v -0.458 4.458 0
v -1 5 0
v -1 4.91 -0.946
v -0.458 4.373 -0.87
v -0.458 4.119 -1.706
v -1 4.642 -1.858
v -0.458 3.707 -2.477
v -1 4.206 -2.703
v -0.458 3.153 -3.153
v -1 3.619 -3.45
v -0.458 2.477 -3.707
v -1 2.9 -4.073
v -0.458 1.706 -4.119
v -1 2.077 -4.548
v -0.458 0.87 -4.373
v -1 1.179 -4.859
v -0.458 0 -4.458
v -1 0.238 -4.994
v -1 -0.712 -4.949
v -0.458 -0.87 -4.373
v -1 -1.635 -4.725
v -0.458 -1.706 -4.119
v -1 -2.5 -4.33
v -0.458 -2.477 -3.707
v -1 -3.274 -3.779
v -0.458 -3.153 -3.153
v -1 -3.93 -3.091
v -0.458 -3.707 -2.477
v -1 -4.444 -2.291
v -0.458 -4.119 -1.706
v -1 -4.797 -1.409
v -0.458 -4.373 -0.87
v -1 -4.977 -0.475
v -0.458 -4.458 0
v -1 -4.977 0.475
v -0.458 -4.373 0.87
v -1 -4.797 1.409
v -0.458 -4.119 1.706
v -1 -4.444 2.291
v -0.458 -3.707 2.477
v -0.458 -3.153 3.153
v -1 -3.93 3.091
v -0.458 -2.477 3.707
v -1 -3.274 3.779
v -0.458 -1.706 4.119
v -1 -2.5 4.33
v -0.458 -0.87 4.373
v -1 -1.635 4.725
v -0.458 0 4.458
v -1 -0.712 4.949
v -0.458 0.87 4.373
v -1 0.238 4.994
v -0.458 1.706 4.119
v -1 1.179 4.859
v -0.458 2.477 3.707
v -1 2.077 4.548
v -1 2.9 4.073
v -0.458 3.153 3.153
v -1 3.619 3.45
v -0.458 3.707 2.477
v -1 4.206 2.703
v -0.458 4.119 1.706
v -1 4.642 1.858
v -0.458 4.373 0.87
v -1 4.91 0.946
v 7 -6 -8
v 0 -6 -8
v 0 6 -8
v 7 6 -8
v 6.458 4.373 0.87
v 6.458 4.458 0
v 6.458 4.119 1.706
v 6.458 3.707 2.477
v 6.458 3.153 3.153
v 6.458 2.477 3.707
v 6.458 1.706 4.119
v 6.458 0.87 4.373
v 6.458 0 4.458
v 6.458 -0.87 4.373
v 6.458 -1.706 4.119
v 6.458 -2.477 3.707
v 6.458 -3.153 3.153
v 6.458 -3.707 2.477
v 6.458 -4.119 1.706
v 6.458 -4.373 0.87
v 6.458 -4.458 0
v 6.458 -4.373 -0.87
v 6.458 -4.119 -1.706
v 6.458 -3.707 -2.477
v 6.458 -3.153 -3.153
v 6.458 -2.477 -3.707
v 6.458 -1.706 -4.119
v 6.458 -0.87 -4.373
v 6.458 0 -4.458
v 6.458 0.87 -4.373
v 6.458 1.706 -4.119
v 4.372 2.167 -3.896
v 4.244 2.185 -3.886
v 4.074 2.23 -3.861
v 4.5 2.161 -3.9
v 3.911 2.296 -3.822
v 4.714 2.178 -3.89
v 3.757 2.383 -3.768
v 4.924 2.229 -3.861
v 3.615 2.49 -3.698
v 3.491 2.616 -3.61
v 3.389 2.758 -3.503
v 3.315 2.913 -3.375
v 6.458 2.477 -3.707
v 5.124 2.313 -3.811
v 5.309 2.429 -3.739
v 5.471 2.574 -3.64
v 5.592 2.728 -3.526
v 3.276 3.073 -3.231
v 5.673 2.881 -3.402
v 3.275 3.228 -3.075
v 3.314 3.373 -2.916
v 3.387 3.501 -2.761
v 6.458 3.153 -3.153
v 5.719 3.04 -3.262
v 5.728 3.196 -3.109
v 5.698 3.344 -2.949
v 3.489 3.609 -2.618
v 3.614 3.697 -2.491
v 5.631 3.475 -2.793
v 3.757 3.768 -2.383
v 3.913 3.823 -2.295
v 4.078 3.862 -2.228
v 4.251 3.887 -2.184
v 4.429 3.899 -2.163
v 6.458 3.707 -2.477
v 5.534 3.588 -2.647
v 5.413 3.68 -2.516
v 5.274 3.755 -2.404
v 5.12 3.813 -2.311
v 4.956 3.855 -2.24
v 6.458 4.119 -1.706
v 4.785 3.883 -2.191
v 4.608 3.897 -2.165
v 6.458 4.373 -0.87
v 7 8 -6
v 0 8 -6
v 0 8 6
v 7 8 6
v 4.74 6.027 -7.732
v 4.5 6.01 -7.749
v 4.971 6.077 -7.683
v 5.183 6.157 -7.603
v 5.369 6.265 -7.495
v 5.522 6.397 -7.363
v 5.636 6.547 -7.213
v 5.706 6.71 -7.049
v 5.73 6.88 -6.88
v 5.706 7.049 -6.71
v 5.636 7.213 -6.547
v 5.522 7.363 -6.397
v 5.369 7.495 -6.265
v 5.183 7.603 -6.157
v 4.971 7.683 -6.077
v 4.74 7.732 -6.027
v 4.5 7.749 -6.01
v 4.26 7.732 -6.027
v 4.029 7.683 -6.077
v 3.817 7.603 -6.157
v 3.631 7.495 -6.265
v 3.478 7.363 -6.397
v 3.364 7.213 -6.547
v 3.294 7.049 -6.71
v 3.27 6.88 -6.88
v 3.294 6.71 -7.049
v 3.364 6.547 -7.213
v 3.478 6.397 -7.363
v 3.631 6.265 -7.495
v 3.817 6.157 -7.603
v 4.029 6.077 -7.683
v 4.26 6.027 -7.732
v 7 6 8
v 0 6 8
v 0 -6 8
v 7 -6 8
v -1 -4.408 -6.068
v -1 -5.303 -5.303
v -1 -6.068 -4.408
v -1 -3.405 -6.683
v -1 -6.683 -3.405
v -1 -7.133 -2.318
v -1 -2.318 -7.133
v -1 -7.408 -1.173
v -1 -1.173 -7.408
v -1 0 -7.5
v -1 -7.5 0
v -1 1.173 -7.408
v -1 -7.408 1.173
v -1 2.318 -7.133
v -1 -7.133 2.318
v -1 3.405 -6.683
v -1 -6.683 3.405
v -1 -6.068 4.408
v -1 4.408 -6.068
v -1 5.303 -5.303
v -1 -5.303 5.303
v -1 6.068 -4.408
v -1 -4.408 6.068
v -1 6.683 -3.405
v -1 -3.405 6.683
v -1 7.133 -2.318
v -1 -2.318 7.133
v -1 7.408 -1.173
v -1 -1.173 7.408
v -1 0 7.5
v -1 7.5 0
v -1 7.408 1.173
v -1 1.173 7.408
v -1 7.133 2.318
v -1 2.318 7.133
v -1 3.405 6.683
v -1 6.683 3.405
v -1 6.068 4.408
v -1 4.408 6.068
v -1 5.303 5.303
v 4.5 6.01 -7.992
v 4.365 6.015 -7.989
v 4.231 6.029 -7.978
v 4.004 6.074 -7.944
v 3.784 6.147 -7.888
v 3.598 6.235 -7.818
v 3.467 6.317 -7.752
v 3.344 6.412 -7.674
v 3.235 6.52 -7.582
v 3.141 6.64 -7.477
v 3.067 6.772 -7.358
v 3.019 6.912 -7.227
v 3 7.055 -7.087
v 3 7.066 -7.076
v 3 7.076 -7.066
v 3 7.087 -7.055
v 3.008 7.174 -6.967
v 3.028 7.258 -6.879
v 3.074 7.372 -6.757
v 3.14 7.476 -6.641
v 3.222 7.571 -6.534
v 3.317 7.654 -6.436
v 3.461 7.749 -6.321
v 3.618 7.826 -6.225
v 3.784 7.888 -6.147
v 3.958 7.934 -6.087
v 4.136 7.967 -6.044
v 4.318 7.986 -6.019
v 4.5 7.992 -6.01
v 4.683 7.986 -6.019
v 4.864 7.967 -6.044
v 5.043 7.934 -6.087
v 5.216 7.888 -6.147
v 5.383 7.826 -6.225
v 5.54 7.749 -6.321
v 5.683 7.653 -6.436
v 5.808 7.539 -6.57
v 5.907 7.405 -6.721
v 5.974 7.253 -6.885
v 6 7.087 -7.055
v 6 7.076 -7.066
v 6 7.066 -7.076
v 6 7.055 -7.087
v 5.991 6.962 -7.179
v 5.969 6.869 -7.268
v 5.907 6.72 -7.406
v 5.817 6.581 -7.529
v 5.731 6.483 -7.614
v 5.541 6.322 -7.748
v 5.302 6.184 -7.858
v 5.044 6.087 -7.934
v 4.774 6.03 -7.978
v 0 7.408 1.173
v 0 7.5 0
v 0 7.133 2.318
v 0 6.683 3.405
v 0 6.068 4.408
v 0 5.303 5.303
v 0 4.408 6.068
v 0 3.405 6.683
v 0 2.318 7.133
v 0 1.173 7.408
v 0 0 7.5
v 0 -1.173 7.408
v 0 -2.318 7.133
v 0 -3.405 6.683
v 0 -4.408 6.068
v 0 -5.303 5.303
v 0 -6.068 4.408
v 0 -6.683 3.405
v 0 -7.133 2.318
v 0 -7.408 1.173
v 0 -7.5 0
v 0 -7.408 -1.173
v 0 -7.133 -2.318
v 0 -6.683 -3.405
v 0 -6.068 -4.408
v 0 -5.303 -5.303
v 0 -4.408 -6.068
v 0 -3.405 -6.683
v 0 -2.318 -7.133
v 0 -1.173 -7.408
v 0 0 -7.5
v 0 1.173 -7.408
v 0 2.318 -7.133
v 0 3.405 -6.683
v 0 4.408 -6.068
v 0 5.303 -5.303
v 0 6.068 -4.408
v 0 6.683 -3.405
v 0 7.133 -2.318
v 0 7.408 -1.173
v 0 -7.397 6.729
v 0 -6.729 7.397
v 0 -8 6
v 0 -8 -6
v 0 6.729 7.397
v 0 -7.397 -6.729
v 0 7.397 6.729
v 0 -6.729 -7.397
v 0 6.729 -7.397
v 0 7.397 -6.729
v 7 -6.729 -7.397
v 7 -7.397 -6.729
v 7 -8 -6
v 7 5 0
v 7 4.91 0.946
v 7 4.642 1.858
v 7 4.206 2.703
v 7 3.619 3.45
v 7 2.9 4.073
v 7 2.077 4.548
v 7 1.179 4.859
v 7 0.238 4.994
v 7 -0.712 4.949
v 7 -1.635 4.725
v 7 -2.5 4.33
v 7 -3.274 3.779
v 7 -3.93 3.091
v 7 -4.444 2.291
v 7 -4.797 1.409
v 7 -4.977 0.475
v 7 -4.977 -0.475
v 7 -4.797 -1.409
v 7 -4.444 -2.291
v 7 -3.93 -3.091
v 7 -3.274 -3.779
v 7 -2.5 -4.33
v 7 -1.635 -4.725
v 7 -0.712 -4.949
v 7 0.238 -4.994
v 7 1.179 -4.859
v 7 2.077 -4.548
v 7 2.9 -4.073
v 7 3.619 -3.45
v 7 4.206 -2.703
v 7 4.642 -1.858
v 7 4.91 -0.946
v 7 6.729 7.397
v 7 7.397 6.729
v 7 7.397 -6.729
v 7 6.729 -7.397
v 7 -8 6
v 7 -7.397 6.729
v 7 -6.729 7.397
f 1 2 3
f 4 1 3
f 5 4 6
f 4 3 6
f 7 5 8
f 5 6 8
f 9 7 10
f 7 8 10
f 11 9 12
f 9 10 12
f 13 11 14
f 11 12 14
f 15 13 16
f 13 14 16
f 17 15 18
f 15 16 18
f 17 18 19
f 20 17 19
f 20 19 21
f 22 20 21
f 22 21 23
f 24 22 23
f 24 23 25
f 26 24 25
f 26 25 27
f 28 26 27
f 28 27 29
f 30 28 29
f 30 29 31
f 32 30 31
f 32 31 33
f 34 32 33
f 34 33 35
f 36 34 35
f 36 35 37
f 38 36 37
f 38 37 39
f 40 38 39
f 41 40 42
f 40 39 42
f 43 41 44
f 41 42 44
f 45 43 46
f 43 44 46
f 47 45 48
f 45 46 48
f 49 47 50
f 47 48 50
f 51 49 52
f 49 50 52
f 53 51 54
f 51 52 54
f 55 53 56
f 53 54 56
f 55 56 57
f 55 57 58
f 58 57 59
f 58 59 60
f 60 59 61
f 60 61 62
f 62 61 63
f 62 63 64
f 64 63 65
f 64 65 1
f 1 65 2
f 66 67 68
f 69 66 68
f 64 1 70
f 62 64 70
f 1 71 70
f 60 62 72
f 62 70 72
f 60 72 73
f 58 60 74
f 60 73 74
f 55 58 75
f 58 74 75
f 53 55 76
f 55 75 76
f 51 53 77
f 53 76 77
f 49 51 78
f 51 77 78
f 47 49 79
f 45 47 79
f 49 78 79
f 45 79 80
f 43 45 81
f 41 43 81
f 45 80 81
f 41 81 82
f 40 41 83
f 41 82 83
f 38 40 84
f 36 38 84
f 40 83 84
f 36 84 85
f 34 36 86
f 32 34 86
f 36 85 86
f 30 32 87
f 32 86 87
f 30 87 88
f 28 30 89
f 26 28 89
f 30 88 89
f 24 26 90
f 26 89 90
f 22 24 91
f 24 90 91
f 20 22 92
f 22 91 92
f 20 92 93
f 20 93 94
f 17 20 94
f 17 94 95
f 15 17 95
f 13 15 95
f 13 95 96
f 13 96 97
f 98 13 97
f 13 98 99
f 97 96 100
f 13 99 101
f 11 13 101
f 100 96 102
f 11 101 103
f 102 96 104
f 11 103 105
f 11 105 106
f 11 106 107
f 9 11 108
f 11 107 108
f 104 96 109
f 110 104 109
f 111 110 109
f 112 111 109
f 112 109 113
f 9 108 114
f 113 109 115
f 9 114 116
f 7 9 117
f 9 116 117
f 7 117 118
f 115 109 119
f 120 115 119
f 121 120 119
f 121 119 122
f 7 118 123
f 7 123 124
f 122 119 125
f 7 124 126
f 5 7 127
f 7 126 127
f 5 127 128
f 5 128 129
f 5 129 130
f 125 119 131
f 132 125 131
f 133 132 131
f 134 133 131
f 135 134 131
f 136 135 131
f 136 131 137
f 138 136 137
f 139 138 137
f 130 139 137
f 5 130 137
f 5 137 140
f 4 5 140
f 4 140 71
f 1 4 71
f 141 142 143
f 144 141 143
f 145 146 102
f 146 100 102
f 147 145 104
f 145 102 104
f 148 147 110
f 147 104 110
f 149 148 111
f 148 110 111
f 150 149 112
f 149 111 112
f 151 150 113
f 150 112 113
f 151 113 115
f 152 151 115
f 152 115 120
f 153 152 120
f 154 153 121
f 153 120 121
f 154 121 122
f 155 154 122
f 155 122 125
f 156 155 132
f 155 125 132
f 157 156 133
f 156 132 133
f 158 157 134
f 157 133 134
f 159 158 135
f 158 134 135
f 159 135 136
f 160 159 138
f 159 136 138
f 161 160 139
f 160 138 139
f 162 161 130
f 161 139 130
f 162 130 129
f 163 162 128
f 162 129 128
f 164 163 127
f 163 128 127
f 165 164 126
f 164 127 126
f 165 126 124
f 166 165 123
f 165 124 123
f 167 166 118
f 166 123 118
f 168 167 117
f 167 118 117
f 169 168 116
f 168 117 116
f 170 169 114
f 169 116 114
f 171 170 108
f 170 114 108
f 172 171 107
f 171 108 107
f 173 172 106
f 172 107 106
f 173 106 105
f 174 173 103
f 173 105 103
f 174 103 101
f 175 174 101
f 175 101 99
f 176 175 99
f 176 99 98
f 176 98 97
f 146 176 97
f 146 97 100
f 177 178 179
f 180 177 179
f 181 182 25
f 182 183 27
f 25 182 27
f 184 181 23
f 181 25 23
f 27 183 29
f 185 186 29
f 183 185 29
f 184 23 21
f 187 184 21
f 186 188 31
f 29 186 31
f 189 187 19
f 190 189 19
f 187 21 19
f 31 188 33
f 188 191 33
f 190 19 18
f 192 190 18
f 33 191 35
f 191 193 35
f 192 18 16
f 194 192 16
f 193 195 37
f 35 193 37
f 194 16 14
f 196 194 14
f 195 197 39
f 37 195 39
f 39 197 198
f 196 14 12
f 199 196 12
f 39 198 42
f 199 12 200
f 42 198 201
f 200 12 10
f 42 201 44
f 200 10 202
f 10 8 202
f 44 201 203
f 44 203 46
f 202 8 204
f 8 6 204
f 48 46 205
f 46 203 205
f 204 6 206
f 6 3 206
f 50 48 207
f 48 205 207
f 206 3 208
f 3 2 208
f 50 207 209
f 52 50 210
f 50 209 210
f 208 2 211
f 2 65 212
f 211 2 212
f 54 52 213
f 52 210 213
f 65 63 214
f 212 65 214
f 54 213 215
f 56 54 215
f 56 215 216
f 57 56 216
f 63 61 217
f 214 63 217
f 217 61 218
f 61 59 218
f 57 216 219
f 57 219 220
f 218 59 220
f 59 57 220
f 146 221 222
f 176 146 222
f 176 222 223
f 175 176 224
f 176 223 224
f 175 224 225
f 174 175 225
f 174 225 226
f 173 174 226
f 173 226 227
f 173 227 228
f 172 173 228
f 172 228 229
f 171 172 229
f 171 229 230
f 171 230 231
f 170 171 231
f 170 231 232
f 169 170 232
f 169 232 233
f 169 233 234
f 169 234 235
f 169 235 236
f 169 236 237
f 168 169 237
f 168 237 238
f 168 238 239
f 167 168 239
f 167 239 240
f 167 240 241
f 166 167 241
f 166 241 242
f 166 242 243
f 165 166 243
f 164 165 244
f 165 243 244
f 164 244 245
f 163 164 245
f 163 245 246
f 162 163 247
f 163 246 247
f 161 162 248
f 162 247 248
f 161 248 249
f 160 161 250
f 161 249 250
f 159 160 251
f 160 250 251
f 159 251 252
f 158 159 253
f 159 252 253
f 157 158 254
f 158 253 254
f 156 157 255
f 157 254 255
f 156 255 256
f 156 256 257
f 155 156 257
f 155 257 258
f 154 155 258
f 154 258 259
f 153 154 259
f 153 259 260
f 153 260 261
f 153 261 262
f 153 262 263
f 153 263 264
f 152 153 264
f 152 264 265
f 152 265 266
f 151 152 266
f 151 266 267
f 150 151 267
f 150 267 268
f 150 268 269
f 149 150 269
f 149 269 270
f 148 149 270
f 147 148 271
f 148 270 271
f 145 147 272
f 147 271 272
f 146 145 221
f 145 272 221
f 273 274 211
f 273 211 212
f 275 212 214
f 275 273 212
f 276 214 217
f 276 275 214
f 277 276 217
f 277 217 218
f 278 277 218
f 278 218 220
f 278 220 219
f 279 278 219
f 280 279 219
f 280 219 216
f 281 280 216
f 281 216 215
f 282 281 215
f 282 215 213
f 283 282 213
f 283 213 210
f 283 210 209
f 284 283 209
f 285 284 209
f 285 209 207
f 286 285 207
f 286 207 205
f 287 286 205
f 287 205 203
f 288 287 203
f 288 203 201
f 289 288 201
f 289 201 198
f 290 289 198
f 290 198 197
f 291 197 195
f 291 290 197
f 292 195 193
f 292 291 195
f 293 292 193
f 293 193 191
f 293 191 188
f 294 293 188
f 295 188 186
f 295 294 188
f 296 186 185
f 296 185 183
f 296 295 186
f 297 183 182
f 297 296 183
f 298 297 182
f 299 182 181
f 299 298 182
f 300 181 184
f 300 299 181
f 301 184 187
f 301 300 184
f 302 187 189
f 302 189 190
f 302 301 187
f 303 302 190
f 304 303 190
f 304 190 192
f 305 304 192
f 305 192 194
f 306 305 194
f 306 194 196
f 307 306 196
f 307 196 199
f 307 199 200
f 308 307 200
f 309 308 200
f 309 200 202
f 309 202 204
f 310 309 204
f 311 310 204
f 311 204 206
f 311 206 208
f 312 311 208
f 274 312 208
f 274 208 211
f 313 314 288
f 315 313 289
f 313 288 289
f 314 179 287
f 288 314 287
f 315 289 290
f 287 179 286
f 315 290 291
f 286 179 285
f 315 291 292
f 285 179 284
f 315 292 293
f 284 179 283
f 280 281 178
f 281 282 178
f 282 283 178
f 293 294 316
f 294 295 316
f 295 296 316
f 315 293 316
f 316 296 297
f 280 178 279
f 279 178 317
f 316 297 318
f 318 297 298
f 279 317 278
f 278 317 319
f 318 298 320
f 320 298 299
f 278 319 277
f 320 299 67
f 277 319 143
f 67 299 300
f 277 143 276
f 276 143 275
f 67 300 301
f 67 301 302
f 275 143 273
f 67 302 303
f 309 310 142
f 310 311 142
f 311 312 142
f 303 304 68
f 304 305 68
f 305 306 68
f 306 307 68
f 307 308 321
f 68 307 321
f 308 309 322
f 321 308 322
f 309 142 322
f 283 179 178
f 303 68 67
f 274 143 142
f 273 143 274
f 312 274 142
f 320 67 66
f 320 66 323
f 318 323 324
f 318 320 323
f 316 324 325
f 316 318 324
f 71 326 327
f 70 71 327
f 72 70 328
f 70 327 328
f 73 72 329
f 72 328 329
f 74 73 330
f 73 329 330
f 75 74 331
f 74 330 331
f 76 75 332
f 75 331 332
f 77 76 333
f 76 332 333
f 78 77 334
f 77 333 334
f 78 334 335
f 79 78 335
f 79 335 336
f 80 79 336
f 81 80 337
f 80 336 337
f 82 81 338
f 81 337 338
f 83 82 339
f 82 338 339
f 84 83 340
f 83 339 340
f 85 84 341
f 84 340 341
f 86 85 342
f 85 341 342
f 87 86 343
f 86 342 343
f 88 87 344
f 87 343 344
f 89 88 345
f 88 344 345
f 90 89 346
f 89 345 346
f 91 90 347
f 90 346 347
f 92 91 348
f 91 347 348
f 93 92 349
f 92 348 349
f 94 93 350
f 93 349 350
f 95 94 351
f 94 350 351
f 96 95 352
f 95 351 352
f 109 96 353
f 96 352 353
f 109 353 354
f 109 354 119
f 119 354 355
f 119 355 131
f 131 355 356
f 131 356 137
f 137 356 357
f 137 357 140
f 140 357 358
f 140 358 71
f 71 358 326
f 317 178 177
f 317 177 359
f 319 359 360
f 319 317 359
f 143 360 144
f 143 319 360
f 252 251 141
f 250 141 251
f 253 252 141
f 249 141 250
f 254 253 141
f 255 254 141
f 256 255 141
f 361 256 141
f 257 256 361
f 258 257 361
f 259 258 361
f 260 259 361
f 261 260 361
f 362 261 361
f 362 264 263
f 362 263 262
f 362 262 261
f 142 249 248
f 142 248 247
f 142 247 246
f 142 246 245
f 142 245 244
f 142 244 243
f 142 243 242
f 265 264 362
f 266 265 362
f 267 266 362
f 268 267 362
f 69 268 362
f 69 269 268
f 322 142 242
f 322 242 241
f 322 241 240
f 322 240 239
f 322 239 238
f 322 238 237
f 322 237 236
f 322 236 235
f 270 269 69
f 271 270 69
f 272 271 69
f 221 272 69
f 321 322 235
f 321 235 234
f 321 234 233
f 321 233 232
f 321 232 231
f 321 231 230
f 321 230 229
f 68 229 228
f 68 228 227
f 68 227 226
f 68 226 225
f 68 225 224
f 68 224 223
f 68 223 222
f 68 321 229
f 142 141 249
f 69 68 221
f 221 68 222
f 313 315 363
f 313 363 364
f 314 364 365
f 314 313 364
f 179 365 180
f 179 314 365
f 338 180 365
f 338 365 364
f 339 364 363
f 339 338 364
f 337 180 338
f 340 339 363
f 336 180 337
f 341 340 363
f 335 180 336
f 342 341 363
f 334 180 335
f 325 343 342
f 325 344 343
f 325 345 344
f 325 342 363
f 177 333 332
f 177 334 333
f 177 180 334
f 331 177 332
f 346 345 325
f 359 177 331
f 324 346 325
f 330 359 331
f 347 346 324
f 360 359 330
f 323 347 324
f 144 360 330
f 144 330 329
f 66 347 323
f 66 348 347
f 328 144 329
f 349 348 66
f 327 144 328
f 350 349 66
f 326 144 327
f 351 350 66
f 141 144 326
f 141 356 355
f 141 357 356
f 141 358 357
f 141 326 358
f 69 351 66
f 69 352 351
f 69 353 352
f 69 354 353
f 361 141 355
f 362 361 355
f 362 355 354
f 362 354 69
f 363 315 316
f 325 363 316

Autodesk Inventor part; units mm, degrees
sketch "Sketch_1" plane through (0, 0, 0) normal (1, 0, 0) x (0, 0, -1)
  line L0 (-8, 6) -> (-8, -6)
  arc A0 (-8, -6) -> (-6, -8) centre (0, 0) ccw
  line L1 (-6, -8) -> (6, -8)
  arc A1 (6, -8) -> (8, -6) centre (0, 0) ccw
  line L2 (8, -6) -> (8, 6)
  arc A2 (8, 6) -> (6, 8) centre (0, 0) ccw
  line L3 (6, 8) -> (-6, 8)
  arc A3 (-6, 8) -> (-8, 6) centre (0, 0) ccw
extrude "Extrusion1" add sketch "Sketch_1" along normal blind 7
sketch "Sketch_2" plane through (0, 0, 0) normal (0, 0, 1) x (1, 0, 0)
  line L0 (0, 0) -> (-1, 0)
  line L1 (-1, 0) -> (-1, 7.5)
  line L2 (-1, 7.5) -> (0, 7.5)
  line L3 (0, 7.5) -> (0, 0)
  line L4 (0, 0) -> (-1, 0)
revolve "Revolution1" add sketch "Sketch_2" angle 360 about axis through (0, 0, 0) along (1, 0, 0)
sketch "Sketch_3" plane through (0, 0, 0) normal (0, 0, 1) x (1, 0, 0)
  line L0 (7, 0) -> (-1, 0)
  line L1 (-1, 0) -> (-1, 5)
  line L2 (-1, 5) -> (-0.4585, 4.4585)
  line L3 (-0.4585, 4.4585) -> (6.4585, 4.4585)
  line L4 (6.4585, 4.4585) -> (7, 5)
  line L5 (7, 5) -> (7, 0)
  line L6 (7, 0) -> (-1, 0)
revolve "Revolution2" cut sketch "Sketch_3" angle 360 about axis through (7, 0, 0) along (1, 0, 0)
thread "Thread1" size "M10x1" class "6H" standard "ISO Metric profile" full length
sketch "Sketch_4" plane through (4.5, 0, 0) normal (1, 0, 0) x (0, 0, -1)
  line L0 (0, 0) -> (7.0711, 7.0711)
  line L1 (7.0711, 7.0711) -> (8.1317, 6.0104)
  line L2 (8.1317, 6.0104) -> (7.7492, 6.0104)
  line L3 (7.7492, 6.0104) -> (0.8694, -0.8694)
  line L4 (0.8694, -0.8694) -> (0, 0)
  line L5 (0, 0) -> (7.0711, 7.0711)
revolve "Revolution3" cut sketch "Sketch_4" angle 360 about axis through (4.5, 0, 0) along (0, -0.7071068, 0.7071068)
thread "Thread2" size "M3x0.5" class "6H" standard "ISO Metric profile" full length
ref_plane "to_collar_XY" through (-1, 0, 0) normal (-1, 0, 0) x (0, -0.7071068, -0.7071068)
ref_plane "to_collar_YZ" through (-1, 0, 0) normal (0, -0.7071068, -0.7071068) x (0, -0.7071068, 0.7071068)
ref_plane "to_collar_ZX" through (-1, 0, 0) normal (0, -0.7071068, 0.7071068) x (-1, 0, 0)
properties part number "C-TFK10_n"
